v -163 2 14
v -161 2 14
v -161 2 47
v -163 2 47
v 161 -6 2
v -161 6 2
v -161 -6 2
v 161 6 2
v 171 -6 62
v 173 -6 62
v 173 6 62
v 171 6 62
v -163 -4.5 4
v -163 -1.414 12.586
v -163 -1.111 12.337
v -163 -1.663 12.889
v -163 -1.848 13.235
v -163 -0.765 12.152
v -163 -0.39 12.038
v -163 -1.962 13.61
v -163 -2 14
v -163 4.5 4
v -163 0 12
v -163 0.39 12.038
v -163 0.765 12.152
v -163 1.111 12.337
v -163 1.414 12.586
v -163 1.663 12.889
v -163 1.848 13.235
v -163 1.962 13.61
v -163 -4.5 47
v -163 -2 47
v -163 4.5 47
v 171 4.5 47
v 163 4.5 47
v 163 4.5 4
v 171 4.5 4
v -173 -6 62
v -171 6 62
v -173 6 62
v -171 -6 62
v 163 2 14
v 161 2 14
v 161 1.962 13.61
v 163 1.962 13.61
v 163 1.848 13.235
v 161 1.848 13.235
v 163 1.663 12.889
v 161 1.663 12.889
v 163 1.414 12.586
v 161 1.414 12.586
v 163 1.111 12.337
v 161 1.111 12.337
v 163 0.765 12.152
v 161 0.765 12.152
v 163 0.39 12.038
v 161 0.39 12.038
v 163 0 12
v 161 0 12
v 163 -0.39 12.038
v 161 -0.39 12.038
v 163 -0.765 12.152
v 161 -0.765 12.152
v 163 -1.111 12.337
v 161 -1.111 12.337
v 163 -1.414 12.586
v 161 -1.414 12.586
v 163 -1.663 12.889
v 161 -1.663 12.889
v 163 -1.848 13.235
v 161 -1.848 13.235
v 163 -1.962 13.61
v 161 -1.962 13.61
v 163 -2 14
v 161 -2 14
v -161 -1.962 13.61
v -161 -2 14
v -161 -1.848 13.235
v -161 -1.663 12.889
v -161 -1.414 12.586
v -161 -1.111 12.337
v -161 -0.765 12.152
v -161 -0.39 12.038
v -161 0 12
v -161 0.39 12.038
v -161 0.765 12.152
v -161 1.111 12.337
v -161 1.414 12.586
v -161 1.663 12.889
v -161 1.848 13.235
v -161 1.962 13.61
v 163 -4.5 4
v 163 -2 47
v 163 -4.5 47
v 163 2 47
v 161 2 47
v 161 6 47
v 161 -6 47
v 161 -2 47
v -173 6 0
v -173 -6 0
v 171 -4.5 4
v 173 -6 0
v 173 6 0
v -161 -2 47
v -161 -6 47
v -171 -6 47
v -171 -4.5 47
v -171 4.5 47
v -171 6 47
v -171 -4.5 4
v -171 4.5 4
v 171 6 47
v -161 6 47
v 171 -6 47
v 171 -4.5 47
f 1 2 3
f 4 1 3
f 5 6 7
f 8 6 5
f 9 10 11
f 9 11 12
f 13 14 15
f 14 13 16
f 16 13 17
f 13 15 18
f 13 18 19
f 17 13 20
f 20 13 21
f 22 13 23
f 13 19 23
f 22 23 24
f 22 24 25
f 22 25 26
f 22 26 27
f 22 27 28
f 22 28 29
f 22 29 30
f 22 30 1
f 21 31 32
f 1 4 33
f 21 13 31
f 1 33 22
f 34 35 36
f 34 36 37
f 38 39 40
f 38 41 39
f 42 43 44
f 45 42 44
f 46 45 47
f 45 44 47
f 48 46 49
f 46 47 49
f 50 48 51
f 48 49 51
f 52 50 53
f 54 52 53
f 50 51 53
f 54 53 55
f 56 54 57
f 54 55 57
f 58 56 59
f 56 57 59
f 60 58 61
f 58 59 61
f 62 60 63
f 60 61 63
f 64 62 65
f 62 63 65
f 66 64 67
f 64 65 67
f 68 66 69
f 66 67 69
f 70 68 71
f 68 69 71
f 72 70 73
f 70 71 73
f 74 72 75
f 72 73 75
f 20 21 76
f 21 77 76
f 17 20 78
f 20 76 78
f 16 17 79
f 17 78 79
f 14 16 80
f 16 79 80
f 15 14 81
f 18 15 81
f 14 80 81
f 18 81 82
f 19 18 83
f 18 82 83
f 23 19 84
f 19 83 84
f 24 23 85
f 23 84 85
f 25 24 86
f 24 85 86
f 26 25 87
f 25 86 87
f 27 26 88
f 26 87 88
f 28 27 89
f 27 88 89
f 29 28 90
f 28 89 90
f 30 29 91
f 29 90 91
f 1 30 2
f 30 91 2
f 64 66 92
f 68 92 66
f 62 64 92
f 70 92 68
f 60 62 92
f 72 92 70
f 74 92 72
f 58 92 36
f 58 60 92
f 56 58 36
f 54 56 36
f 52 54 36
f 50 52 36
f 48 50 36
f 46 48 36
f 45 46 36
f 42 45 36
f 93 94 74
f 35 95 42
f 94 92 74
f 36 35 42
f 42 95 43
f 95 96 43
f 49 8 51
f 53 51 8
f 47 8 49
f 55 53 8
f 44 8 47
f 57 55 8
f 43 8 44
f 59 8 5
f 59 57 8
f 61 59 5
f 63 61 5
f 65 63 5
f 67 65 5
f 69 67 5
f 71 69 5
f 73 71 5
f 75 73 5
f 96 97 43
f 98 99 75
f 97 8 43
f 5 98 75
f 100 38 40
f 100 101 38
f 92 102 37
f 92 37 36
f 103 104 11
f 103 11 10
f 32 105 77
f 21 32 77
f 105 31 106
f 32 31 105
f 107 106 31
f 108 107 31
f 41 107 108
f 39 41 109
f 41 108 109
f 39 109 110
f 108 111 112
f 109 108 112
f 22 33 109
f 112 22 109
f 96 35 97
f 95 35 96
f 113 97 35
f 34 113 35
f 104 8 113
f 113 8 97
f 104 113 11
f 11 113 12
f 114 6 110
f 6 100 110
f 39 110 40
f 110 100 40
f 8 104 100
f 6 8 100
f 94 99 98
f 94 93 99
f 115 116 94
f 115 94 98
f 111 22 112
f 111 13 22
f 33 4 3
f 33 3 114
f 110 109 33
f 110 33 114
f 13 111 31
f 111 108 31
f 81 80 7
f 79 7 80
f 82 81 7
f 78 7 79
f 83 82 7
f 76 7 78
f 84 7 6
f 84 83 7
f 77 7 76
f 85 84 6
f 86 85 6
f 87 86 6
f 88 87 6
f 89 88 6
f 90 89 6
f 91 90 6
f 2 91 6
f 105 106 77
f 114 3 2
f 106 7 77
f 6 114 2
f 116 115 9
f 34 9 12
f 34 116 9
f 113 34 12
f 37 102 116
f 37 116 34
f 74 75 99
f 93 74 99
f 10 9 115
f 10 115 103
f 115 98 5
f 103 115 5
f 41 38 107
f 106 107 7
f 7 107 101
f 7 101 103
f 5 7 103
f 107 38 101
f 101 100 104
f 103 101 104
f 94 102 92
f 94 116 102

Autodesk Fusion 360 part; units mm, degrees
sketch "Sketch1" plane through (0, 0, 0) normal (0, 0, 1) x (1, 0, 0)
  line L0 (-173, 6) -> (173, 6)
  line L1 (173, 6) -> (173, -6)
  line L2 (173, -6) -> (-173, -6)
  line L3 (-173, -6) -> (-173, 6)
  dimension "d1" = 346
  dimension "d2" = 12
extrude "Extrude1" add sketch "Sketch1" along normal blind 2
sketch "Sketch2" plane through (0, 0, 2) normal (0, 0, 1) x (-1, 0, 0)
  line L0 (173, 6) -> (-173, 6)
  line L1 (-173, 6) -> (-173, -6)
  line L2 (-173, -6) -> (173, -6)
  line L3 (173, -6) -> (173, 6)
  line L4 (-171, 6) -> (-171, -6)
  line L5 (-171, 6) -> (-173, 6)
  line L6 (-173, -6) -> (-171, -6)
  line L7 (171, 6) -> (171, -6)
  line L8 (171, 6) -> (173, 6)
  line L9 (173, -6) -> (171, -6)
  dimension "d9" = 2
  dimension "d10" = 2
extrude "Extrude2" add sketch "Sketch2" along normal blind 60 contours L0 L2 L3 L7 L8 L9 | L0 L1 L2 L4 L5 L6
sketch "Sketch3" plane through (171, 0, 0) normal (-1, 0, 0) x (0, -1, 0)
  line L0 (-6, 2) -> (6, 2)
  line L1 (6, 2) -> (6, 62)
  line L2 (6, 62) -> (-6, 62)
  line L3 (-6, 62) -> (-6, 2)
  line L4 (-6, 62) -> (-6, 47)
  line L5 (-6, 47) -> (6, 47)
  line L6 (6, 47) -> (6, 0)
  line L7 (6, 0) -> (-6, 0)
  line L8 (-6, 0) -> (-6, 47)
  dimension "d13" = 15
extrude "Extrude3" add sketch "Sketch3" along normal blind 10 contours L0 L1 L3 L5 L6 L8
sketch "Sketch4" plane through (0, 0, 47) normal (0, 0, 1) x (-1, 0, 0)
  line L0 (-171, 6) -> (-171, -6)
  line L1 (-171, -6) -> (-161, -6)
  line L2 (-161, -6) -> (-161, 6)
  line L3 (-161, 6) -> (-171, 6)
  line L4 (-171, 4.5) -> (-170, 4.5)
  line L5 (-170, 4.5) -> (-163, 4.5)
  line L6 (-163, 4.5) -> (-163, -4.5)
  line L7 (-163, -4.5) -> (-171, -4.5)
  line L8 (-171, 4.5) -> (-171, 3.6158)
  dimension "d16" = 1.5
  dimension "d17" = 1.5
  dimension "d18" = 8
extrude "Extrude4" cut sketch "Sketch4" against normal blind 43 contours L0 L4 L5 L6 L7 L8
sketch "Sketch5" plane through (161, 0, 0) normal (-1, 0, 0) x (0, -1, 0)
  line L0 (-6, 47) -> (-6, 2)
  line L1 (-6, 2) -> (6, 2)
  line L2 (6, 2) -> (6, 47)
  line L3 (6, 47) -> (-6, 47)
  line L4 (-6, 47) -> (6, 47)
  line L5 (0, 47) -> (-2, 47)
  line L6 (3, 12) -> (3, 13.1676)
  line L7 (-2, 47) -> (-2, 14)
  line L8 (2, 14) -> (2, 47)
  line L9 (2, 47) -> (-2, 47)
  arc A0 (0, 12) -> (2, 14) centre (0, 14) ccw
  arc A1 (-2, 14) -> (0, 12) centre (0, 14) ccw
  point P0 (-2, 12)
  point P1 (3.9688, 12.6113)
  point P2 (-2, 12)
  point P3 (2, 12)
  dimension "d21" = 2
  dimension "d30" = 35
  dimension "d31" = 4
  dimension "d32" = 35
  dimension "d33" = 2
  dimension "d34" = 2
extrude "Extrude5" cut sketch "Sketch5" against normal blind 2 contours L3 L4 L5 L7 L8 L9 A0 A1
sketch "Sketch6" plane through (-171, 0, 0) normal (1, 0, 0) x (0, 1, 0)
  line L0 (-6, 2) -> (6, 2)
  line L1 (6, 2) -> (6, 62)
  line L2 (6, 62) -> (-6, 62)
  line L3 (-6, 62) -> (-6, 2)
  line L4 (-6, 62) -> (-6, 47)
  line L5 (-6, 47) -> (6, 47)
  line L6 (-6, 47) -> (-6, 0)
  line L7 (-6, 0) -> (6, 0)
  line L8 (6, 0) -> (6, 47)
  dimension "d37" = 15
extrude "Extrude6" add sketch "Sketch6" along normal blind 10 contours L0 L1 L3 L5 L6 L8
sketch "Sketch7" plane through (0, 0, 47) normal (0, 0, 1) x (-1, 0, 0)
  line L0 (171, -6) -> (171, 6)
  line L1 (171, 6) -> (161, 6)
  line L2 (161, 6) -> (161, -6)
  line L3 (161, -6) -> (171, -6)
  line L4 (171, 4.5) -> (163, 4.5)
  line L5 (163, 4.5) -> (163, -4.5)
  line L6 (163, -4.5) -> (171, -4.5)
  dimension "d40" = 1.5
  dimension "d41" = 1.5
  dimension "d42" = 2
extrude "Extrude7" cut sketch "Sketch7" against normal blind 43 contours L0 L4 L5 L6
sketch "Sketch8" plane through (-161, 0, 0) normal (1, 0, 0) x (0, 1, 0)
  line L0 (-6, 47) -> (-6, 2)
  line L1 (-6, 2) -> (6, 2)
  line L2 (6, 2) -> (6, 47)
  line L3 (6, 47) -> (-6, 47)
  line L4 (6, 47) -> (-6, 47)
  line L5 (0, 47) -> (-2, 47)
  line L6 (-2, 47) -> (-2, 14)
  line L7 (2, 14) -> (2, 47)
  line L8 (2, 47) -> (-2, 47)
  arc A0 (-2, 14) -> (0, 12) centre (0, 14) ccw
  arc A1 (0, 12) -> (2, 14) centre (0, 14) ccw
  point P0 (-2, 12)
  point P1 (2, 12)
  dimension "d45" = 2
  dimension "d46" = 35
  dimension "d47" = 4
  dimension "d48" = 35
  dimension "d49" = 2
  dimension "d50" = 2
extrude "Extrude8" cut sketch "Sketch8" against normal blind 2 contours L3 L4 L5 L6 L7 L8 A0 A1
